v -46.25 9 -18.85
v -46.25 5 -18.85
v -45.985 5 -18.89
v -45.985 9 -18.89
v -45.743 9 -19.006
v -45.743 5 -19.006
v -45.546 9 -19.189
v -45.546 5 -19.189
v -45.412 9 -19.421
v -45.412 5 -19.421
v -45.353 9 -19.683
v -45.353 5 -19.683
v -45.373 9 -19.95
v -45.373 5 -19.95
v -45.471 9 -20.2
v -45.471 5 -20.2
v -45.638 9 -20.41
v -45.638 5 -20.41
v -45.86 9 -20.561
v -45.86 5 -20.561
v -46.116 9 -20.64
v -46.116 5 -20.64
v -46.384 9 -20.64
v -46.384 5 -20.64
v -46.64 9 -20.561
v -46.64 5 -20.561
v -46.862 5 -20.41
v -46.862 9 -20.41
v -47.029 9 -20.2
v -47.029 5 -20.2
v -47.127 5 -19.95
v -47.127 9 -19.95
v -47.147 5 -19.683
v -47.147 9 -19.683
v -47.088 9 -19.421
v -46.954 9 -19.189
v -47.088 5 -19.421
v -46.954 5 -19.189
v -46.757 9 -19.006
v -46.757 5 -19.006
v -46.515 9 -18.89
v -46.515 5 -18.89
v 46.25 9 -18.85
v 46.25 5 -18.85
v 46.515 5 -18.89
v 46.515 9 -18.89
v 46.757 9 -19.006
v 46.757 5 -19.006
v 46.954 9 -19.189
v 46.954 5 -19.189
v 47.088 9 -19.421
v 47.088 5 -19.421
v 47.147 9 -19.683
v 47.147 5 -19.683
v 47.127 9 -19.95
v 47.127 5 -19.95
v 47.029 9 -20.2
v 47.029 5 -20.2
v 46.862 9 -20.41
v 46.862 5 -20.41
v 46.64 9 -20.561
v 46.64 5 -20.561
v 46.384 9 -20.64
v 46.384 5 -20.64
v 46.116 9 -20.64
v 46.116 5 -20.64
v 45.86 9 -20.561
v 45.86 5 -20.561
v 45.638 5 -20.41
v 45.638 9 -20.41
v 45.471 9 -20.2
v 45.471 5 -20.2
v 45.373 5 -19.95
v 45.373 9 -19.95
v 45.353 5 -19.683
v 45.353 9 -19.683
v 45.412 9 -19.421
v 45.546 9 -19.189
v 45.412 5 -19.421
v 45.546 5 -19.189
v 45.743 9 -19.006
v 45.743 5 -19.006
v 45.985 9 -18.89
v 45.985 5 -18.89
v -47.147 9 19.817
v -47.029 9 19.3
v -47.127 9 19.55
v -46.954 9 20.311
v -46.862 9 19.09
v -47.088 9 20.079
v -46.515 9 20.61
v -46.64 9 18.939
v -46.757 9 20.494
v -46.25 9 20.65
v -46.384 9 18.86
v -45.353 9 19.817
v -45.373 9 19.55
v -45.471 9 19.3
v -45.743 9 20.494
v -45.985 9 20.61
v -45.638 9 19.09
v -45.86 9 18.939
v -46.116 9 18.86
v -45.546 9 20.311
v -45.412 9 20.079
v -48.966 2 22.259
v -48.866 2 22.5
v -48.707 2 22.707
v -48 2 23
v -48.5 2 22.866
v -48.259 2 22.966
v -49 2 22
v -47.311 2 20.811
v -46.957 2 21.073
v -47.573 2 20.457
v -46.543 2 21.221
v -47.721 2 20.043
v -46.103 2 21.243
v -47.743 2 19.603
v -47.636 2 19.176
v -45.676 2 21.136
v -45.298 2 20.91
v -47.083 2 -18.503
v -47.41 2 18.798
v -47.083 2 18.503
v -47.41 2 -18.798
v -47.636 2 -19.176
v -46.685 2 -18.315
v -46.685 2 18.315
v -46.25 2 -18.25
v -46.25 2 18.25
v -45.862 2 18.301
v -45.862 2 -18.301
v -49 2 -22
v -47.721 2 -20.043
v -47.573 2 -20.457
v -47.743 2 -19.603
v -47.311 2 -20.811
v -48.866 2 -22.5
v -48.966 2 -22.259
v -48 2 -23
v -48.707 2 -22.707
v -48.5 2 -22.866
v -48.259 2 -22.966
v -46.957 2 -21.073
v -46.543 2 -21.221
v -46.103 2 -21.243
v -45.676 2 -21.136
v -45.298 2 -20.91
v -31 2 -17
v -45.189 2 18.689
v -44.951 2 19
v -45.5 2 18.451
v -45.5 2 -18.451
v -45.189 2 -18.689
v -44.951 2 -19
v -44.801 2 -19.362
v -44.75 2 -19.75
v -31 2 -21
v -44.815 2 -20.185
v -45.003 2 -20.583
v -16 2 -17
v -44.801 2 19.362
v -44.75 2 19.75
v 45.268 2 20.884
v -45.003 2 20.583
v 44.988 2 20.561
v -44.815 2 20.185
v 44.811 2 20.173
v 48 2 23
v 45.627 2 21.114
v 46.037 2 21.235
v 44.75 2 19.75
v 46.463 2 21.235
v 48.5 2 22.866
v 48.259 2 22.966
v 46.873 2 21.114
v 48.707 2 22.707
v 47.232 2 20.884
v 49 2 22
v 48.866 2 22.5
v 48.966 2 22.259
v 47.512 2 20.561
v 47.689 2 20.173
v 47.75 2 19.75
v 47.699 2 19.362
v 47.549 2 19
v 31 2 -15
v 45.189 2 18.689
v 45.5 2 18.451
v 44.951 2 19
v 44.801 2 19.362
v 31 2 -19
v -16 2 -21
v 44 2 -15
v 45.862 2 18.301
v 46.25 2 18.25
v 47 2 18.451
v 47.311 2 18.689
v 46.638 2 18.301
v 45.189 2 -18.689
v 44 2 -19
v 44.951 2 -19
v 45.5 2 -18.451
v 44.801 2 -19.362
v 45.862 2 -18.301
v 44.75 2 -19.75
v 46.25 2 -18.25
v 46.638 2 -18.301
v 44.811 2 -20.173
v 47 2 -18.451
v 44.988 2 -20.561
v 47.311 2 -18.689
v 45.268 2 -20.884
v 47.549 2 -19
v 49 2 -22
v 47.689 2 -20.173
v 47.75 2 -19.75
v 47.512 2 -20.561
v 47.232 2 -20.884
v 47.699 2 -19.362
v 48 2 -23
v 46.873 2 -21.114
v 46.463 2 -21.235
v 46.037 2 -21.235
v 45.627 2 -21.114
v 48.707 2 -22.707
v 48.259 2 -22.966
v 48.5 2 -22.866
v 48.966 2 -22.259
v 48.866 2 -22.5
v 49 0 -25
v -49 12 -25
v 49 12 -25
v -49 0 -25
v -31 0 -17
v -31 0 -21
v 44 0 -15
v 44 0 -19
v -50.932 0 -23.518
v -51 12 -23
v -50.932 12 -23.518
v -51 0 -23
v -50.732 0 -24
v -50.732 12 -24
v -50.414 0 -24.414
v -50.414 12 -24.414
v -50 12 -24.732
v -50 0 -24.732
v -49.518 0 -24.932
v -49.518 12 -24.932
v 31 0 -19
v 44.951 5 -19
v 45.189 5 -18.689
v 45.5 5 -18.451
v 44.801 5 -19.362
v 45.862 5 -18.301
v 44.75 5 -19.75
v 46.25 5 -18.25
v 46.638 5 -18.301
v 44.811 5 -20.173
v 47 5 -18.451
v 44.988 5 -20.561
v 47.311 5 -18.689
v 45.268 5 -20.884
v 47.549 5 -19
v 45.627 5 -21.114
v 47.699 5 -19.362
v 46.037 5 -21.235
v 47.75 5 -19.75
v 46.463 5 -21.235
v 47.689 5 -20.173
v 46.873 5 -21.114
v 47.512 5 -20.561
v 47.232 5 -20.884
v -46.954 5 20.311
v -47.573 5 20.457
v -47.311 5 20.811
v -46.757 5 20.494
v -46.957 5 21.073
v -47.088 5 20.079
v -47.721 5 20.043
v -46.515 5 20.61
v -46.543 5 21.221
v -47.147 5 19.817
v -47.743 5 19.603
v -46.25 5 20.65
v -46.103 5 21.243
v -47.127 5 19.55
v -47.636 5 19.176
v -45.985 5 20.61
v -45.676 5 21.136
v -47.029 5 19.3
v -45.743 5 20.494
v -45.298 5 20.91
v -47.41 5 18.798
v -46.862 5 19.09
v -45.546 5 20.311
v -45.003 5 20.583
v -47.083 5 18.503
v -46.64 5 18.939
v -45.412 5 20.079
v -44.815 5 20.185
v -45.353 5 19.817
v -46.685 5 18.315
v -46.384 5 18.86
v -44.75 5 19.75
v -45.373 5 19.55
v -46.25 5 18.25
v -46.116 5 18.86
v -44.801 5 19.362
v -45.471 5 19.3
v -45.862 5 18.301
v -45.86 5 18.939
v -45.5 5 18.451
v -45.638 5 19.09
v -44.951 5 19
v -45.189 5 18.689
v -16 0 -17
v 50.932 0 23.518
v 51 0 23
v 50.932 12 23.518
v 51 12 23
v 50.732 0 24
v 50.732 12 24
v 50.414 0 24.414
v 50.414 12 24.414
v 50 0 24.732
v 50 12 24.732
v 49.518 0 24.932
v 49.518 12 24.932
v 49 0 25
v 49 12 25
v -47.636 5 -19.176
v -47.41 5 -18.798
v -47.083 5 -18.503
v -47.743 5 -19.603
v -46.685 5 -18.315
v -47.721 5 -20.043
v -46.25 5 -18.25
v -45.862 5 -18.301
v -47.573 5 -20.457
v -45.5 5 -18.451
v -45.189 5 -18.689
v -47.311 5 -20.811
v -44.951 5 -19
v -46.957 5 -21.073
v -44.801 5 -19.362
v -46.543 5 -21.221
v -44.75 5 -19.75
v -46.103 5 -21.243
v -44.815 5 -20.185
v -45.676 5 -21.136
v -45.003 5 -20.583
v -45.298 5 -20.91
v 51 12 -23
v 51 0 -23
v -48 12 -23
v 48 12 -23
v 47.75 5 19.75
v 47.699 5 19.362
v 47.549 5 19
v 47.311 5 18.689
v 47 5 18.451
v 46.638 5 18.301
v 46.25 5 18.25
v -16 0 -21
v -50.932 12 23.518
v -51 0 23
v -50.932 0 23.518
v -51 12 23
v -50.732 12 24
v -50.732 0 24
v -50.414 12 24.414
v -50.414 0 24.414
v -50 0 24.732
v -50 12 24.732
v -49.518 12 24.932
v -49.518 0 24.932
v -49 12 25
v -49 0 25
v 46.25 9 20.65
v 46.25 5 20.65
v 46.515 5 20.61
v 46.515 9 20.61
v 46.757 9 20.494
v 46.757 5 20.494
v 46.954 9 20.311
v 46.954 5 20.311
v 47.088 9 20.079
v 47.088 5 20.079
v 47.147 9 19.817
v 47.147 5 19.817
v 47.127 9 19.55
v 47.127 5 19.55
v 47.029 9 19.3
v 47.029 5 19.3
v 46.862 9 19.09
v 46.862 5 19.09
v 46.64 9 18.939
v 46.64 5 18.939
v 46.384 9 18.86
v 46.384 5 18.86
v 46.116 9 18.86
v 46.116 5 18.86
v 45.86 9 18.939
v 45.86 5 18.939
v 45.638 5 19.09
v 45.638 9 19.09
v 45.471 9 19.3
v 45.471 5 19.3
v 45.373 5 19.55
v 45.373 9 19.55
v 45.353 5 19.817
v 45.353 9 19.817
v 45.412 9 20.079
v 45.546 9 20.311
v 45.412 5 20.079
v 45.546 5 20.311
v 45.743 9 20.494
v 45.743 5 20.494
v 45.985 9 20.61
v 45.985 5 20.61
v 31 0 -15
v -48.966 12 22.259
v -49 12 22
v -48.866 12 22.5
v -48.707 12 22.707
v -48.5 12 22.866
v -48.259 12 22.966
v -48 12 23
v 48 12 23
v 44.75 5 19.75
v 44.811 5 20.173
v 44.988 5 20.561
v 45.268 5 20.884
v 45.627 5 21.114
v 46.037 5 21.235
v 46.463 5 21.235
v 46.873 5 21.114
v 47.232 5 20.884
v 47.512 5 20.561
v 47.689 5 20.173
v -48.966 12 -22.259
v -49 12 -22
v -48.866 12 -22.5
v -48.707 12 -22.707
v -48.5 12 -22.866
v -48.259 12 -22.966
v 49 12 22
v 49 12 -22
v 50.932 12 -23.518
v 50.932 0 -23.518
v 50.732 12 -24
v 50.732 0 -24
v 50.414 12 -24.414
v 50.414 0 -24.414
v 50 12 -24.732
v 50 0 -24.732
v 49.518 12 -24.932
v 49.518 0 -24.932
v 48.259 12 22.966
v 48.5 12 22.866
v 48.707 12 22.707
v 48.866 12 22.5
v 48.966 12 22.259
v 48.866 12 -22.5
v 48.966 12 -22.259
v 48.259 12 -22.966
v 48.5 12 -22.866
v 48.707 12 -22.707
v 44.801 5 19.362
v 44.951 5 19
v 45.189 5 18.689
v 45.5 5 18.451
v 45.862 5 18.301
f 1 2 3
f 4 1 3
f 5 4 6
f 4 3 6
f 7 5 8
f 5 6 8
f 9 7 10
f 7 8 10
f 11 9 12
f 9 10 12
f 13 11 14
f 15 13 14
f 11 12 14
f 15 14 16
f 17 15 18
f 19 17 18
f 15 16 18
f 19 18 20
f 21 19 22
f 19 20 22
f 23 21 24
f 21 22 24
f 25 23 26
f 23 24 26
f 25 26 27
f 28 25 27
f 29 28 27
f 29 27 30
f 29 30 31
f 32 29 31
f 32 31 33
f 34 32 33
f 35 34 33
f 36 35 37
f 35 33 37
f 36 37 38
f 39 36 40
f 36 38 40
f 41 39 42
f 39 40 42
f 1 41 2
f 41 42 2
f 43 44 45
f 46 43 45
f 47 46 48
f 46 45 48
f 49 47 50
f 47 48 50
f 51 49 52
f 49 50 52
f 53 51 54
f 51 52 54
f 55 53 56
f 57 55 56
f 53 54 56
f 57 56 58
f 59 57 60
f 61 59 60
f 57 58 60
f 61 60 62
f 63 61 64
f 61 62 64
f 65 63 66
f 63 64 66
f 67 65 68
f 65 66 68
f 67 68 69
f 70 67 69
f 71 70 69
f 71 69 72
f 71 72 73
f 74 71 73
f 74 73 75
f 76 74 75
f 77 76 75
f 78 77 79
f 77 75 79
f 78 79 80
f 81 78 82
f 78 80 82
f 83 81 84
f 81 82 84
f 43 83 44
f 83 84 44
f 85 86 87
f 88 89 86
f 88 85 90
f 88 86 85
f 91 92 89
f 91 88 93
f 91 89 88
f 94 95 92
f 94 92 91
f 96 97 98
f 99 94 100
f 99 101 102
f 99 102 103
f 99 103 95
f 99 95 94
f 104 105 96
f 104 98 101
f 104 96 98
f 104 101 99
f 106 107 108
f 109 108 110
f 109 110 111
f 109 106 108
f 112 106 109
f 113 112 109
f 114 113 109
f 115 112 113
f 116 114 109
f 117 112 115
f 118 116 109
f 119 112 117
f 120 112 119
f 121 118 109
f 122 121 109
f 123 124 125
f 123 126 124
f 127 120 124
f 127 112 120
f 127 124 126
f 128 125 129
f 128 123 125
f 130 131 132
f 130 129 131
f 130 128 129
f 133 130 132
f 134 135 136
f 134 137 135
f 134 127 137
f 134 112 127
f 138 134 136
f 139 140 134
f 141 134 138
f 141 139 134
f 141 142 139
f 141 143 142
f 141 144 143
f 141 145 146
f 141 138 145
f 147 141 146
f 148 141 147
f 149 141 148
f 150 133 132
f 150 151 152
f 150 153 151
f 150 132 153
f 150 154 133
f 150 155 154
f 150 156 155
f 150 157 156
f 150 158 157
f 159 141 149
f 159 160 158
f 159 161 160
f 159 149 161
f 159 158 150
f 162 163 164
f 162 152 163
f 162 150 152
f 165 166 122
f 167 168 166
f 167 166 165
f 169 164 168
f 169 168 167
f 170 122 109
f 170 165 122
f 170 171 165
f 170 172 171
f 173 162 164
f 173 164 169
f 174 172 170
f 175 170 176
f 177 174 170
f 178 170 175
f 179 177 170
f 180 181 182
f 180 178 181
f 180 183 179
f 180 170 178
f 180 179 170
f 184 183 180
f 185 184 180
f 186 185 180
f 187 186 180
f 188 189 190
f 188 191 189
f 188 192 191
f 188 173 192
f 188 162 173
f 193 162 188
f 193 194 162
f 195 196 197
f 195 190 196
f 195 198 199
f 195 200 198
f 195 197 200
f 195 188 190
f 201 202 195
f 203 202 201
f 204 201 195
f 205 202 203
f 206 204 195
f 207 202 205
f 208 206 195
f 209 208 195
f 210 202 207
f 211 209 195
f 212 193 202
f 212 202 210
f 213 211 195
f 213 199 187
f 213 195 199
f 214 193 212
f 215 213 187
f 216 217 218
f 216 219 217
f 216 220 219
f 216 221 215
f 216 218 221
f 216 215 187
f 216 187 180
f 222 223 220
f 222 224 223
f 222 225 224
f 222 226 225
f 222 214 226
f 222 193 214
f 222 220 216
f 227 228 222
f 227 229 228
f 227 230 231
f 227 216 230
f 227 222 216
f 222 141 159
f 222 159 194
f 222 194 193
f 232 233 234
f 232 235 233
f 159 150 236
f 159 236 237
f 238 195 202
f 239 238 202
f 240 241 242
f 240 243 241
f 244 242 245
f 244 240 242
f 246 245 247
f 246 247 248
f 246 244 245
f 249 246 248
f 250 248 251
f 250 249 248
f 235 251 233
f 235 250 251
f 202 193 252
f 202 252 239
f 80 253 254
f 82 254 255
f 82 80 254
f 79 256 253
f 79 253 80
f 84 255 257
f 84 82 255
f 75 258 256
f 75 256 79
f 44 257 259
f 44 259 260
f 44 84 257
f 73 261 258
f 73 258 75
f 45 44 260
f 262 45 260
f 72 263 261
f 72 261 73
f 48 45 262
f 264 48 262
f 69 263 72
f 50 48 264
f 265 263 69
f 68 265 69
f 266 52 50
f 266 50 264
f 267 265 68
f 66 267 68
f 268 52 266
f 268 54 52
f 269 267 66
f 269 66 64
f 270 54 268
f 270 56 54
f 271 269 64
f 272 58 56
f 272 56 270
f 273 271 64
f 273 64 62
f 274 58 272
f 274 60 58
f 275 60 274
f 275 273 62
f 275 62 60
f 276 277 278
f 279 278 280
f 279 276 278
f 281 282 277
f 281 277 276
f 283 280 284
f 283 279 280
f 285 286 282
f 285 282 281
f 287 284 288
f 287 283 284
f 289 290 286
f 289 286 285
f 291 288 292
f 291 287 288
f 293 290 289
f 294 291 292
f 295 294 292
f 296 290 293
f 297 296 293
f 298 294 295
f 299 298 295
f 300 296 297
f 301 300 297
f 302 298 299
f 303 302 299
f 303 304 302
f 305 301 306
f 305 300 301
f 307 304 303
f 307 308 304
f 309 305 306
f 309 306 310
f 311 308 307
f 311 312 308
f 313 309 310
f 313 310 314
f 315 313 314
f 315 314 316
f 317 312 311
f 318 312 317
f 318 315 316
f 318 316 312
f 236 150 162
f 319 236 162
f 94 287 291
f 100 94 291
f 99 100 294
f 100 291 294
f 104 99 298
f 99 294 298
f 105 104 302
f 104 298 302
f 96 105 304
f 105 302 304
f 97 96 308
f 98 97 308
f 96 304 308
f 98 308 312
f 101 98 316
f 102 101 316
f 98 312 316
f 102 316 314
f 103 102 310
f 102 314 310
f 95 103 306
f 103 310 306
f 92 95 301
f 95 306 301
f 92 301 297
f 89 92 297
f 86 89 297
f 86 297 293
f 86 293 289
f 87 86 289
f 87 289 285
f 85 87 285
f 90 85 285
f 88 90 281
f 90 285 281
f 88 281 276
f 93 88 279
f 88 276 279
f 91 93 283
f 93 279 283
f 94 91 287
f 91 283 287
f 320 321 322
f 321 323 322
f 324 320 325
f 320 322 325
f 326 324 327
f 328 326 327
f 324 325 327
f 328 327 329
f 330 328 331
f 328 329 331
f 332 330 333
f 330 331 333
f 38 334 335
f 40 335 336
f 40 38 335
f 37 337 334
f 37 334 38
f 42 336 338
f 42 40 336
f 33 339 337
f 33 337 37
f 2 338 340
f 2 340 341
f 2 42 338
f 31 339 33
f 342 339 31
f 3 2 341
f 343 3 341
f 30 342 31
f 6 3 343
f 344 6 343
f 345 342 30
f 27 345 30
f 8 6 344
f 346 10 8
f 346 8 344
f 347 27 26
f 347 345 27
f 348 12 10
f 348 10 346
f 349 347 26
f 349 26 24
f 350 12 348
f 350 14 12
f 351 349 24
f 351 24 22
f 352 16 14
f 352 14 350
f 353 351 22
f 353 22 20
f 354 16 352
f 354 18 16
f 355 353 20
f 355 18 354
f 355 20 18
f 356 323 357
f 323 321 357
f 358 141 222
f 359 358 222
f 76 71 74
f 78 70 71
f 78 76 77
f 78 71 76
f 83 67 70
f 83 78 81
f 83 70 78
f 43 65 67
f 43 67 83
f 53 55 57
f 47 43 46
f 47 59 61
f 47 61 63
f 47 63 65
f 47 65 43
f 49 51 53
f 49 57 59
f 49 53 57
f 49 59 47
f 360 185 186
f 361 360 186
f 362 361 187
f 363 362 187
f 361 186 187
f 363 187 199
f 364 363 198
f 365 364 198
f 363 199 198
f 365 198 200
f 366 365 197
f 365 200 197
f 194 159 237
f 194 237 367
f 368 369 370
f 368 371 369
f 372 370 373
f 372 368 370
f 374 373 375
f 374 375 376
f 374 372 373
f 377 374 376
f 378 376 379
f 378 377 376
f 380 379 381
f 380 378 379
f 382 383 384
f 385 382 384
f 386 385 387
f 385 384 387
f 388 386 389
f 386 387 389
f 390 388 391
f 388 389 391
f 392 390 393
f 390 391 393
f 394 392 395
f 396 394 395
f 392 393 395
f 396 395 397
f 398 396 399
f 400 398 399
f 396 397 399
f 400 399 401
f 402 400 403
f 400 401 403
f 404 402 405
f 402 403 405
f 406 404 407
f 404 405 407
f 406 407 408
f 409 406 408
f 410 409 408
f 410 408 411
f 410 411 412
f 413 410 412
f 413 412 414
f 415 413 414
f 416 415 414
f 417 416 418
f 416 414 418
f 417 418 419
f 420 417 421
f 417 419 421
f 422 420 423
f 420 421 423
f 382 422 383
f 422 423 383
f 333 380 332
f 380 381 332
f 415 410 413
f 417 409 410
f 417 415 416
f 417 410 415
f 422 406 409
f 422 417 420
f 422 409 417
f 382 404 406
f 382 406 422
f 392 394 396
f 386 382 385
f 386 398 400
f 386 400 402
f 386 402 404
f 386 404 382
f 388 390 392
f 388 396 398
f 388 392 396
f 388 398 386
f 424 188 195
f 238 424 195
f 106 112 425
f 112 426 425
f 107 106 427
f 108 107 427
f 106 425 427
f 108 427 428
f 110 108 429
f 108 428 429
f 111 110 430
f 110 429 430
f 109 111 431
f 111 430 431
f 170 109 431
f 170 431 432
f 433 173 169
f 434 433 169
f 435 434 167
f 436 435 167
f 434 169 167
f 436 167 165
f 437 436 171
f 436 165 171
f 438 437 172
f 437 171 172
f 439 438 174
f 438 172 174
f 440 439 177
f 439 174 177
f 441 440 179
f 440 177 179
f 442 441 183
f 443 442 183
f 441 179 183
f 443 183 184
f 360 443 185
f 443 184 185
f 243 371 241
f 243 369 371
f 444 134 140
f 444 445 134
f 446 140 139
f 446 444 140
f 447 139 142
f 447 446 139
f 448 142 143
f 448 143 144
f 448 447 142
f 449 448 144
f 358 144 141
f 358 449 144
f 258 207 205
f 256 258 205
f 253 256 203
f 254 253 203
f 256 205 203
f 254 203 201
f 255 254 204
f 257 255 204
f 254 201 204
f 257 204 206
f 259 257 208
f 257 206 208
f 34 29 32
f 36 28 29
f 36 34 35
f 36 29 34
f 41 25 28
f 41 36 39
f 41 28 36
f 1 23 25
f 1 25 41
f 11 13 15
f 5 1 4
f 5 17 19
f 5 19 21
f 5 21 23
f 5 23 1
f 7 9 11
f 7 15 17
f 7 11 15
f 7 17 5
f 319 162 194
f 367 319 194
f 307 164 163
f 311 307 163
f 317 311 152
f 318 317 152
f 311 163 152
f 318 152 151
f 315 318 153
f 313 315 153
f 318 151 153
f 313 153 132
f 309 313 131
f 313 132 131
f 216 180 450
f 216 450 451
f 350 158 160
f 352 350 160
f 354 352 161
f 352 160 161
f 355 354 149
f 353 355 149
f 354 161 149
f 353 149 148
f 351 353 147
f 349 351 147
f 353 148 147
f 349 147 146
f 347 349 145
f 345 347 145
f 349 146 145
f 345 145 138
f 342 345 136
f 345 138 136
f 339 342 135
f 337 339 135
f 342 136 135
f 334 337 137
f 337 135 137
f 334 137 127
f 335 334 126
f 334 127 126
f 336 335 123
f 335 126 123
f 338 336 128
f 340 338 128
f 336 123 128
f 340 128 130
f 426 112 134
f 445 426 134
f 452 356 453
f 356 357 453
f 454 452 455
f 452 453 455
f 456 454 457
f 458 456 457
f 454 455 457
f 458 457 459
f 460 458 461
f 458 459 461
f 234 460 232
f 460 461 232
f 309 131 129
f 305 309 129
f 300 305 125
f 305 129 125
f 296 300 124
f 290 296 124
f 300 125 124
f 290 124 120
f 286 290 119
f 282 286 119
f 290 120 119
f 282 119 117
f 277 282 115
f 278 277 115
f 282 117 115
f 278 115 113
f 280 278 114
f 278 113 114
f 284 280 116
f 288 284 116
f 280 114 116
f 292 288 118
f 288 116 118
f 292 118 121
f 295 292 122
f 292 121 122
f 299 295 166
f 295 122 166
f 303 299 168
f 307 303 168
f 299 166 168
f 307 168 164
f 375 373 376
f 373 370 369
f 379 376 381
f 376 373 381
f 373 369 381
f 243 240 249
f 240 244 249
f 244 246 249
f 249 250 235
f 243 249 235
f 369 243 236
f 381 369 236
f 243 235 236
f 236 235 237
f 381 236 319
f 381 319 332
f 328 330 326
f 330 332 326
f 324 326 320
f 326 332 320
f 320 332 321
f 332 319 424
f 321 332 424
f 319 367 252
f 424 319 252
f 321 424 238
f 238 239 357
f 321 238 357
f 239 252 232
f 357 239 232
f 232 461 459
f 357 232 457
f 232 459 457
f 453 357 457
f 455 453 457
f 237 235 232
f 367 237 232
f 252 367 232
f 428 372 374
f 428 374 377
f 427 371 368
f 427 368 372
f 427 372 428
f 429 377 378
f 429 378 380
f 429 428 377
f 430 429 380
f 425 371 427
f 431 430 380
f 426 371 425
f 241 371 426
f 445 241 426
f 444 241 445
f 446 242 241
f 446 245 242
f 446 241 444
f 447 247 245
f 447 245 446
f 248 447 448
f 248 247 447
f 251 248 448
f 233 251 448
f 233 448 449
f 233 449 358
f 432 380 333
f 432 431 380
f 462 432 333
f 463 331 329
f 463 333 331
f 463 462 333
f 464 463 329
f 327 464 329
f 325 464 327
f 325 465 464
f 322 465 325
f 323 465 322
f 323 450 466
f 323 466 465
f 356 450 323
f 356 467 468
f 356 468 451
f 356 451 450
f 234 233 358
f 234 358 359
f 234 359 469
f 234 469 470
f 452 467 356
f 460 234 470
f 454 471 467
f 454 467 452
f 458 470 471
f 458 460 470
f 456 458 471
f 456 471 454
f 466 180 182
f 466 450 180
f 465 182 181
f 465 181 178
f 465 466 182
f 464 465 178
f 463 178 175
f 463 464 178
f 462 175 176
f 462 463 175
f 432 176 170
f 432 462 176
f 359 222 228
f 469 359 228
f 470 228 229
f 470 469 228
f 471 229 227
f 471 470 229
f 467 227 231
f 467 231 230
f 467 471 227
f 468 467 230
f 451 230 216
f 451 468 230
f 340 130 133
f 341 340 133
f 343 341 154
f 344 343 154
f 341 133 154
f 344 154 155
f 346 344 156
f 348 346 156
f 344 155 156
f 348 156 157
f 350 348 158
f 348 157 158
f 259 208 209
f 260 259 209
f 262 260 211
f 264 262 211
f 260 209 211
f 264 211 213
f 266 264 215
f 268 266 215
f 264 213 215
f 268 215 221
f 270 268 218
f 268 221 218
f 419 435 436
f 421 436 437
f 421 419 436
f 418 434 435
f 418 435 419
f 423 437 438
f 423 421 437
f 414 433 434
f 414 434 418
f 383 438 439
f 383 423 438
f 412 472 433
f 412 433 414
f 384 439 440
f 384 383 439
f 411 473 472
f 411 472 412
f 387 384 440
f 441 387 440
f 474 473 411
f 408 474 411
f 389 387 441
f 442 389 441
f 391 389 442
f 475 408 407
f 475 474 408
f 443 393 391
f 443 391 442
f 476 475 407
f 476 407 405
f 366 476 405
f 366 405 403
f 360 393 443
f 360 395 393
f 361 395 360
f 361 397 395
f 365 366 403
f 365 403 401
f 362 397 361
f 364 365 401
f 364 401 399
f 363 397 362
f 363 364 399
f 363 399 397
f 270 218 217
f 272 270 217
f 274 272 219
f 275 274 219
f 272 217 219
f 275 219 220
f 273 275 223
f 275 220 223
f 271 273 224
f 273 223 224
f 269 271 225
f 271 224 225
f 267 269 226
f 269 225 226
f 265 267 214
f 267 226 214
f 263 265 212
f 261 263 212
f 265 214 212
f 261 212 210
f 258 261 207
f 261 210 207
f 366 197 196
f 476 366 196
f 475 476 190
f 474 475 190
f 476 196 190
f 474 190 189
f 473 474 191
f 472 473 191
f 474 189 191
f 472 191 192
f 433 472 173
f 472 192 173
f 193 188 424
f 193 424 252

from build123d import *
from OCP.BRepFilletAPI import BRepFilletAPI_MakeFillet

# Parameters (mm, degrees)
SKETCH2_W           = 102
SKETCH2_H           = 50
BOSS_EXTRUDE2_DEPTH = 2
SKETCH1_W           = 102
SKETCH1_H           = 50
SKETCH1_W_2         = 98
SKETCH1_H_2         = 46
BOSS_EXTRUDE1_DEPTH = 12
FILLET1_R1          = 2
FILLET1_R2          = 1
BOSS_EXTRUDE3_DEPTH = 3
SKETCH4_R           = 0.9
BOSS_EXTRUDE4_DEPTH = 4
SKETCH5_W           = 15
SKETCH5_H           = 4
SKETCH5_W_2         = 13
CUT_EXTRUDE1_DEPTH  = 10


with BuildPart() as part:
    # Sketch2 → Boss-Extrude2 (new body)
    with BuildSketch(Plane(origin=(0, 0, 0), x_dir=(1, 0, 0), z_dir=(0, 1, 0))):
        Rectangle(SKETCH2_W, SKETCH2_H)
    extrude(amount=BOSS_EXTRUDE2_DEPTH)

    # Sketch1 → Boss-Extrude1 (add)
    with BuildSketch(Plane(origin=(0, 0, 0), x_dir=(1, 0, 0), z_dir=(0, 1, 0))):
        Rectangle(SKETCH1_W, SKETCH1_H)
        Rectangle(SKETCH1_W_2, SKETCH1_H_2, mode=Mode.SUBTRACT)
    extrude(amount=BOSS_EXTRUDE1_DEPTH)

    # Fillet1: one fillet with a radius per group of edges: ONE call of the kernel's fillet builder (fillet() takes one radius for all edges)
    fillet1_edges_1 = [part.edges().sort_by_distance(p)[0] for p in [
        (51, 6, 25),
        (51, 6, -25),
        (-51, 6, -25),
        (-51, 6, 25),
    ]]
    fillet1_edges_2 = [part.edges().sort_by_distance(p)[0] for p in [
        (-49, 7, 23),
        (49, 7, 23),
        (49, 7, -23),
        (-49, 7, -23),
    ]]
    fillet1 = BRepFilletAPI_MakeFillet(part.part.solid().wrapped)
    for e in fillet1_edges_1:
        fillet1.Add(FILLET1_R1, e.wrapped)
    for e in fillet1_edges_2:
        fillet1.Add(FILLET1_R2, e.wrapped)
    add(Compound.cast(fillet1.Shape()), mode=Mode.REPLACE)

    # Sketch3 → Boss-Extrude3 (add)
    with BuildSketch(Plane(origin=(0, 2, 0), x_dir=(1, 0, 0), z_dir=(0, 1, 0))):
        with BuildLine():
            ThreePointArc((-44.75, 19.75), (-47.310660172, 20.810660172), (-46.25, 18.25))
            Line((-46.25, 18.25), (-46.25, 19.75))
            Line((-46.25, 19.75), (-44.75, 19.75))
        make_face()
        with BuildLine():
            Line((-46.25, 19.75), (-46.25, 18.25))
            ThreePointArc((-46.25, 18.25), (-45.189339828, 18.689339828), (-44.75, 19.75))
            Line((-44.75, 19.75), (-46.25, 19.75))
        make_face()
        with BuildLine():
            Line((-46.25, -18.25), (-46.25, -19.75))
            Line((-46.25, -19.75), (-44.75, -19.75))
            ThreePointArc((-44.75, -19.75), (-45.189339828, -18.689339828), (-46.25, -18.25))
        make_face()
        with BuildLine():
            Line((-44.75, -19.75), (-46.25, -19.75))
            Line((-46.25, -19.75), (-46.25, -18.25))
            ThreePointArc((-46.25, -18.25), (-47.310660172, -20.810660172), (-44.75, -19.75))
        make_face()
        with BuildLine():
            ThreePointArc((46.25, -18.25), (45.189339828, -18.689339828), (44.75, -19.75))
            Line((44.75, -19.75), (46.25, -19.75))
            Line((46.25, -19.75), (46.25, -18.25))
        make_face()
        with BuildLine():
            Line((46.25, -19.75), (44.75, -19.75))
            ThreePointArc((44.75, -19.75), (46.25, -21.25), (47.75, -19.75))
            ThreePointArc((47.75, -19.75), (47.310660172, -18.689339828), (46.25, -18.25))
            Line((46.25, -18.25), (46.25, -19.75))
        make_face()
        with BuildLine():
            ThreePointArc((44.75, 19.75), (45.189339828, 18.689339828), (46.25, 18.25))
            Line((46.25, 18.25), (46.25, 19.75))
            Line((46.25, 19.75), (44.75, 19.75))
        make_face()
        with BuildLine():
            Line((46.25, 19.75), (46.25, 18.25))
            ThreePointArc((46.25, 18.25), (47.310660172, 18.689339828), (47.75, 19.75))
            ThreePointArc((47.75, 19.75), (46.25, 21.25), (44.75, 19.75))
            Line((44.75, 19.75), (46.25, 19.75))
        make_face()
    extrude(amount=BOSS_EXTRUDE3_DEPTH)

    # Sketch4 → Boss-Extrude4 (add)
    with BuildSketch(Plane(origin=(0, 5, 0), x_dir=(1, 0, 0), z_dir=(0, 1, 0))):
        with Locations(Location((-46.25, 19.75, 0), (0, 0, 270))):
            Circle(SKETCH4_R)
        with Locations(Location((-46.25, -19.75, 0), (0, 0, 270))):
            Circle(SKETCH4_R)
        with Locations(Location((46.25, 19.75, 0), (0, 0, 270))):
            Circle(SKETCH4_R)
        with Locations(Location((46.25, -19.75, 0), (0, 0, 270))):
            Circle(SKETCH4_R)
    extrude(amount=BOSS_EXTRUDE4_DEPTH)

    # Sketch5 → Cut-Extrude1 (cut)
    with BuildSketch(Plane(origin=(0, 2, 0), x_dir=(1, 0, 0), z_dir=(0, 1, 0))):
        with Locations((-23.5, 19)):
            Rectangle(SKETCH5_W, SKETCH5_H)
        with Locations((37.5, 17)):
            Rectangle(SKETCH5_W_2, SKETCH5_H)
    extrude(amount=-CUT_EXTRUDE1_DEPTH, mode=Mode.SUBTRACT)


solid = part.part
